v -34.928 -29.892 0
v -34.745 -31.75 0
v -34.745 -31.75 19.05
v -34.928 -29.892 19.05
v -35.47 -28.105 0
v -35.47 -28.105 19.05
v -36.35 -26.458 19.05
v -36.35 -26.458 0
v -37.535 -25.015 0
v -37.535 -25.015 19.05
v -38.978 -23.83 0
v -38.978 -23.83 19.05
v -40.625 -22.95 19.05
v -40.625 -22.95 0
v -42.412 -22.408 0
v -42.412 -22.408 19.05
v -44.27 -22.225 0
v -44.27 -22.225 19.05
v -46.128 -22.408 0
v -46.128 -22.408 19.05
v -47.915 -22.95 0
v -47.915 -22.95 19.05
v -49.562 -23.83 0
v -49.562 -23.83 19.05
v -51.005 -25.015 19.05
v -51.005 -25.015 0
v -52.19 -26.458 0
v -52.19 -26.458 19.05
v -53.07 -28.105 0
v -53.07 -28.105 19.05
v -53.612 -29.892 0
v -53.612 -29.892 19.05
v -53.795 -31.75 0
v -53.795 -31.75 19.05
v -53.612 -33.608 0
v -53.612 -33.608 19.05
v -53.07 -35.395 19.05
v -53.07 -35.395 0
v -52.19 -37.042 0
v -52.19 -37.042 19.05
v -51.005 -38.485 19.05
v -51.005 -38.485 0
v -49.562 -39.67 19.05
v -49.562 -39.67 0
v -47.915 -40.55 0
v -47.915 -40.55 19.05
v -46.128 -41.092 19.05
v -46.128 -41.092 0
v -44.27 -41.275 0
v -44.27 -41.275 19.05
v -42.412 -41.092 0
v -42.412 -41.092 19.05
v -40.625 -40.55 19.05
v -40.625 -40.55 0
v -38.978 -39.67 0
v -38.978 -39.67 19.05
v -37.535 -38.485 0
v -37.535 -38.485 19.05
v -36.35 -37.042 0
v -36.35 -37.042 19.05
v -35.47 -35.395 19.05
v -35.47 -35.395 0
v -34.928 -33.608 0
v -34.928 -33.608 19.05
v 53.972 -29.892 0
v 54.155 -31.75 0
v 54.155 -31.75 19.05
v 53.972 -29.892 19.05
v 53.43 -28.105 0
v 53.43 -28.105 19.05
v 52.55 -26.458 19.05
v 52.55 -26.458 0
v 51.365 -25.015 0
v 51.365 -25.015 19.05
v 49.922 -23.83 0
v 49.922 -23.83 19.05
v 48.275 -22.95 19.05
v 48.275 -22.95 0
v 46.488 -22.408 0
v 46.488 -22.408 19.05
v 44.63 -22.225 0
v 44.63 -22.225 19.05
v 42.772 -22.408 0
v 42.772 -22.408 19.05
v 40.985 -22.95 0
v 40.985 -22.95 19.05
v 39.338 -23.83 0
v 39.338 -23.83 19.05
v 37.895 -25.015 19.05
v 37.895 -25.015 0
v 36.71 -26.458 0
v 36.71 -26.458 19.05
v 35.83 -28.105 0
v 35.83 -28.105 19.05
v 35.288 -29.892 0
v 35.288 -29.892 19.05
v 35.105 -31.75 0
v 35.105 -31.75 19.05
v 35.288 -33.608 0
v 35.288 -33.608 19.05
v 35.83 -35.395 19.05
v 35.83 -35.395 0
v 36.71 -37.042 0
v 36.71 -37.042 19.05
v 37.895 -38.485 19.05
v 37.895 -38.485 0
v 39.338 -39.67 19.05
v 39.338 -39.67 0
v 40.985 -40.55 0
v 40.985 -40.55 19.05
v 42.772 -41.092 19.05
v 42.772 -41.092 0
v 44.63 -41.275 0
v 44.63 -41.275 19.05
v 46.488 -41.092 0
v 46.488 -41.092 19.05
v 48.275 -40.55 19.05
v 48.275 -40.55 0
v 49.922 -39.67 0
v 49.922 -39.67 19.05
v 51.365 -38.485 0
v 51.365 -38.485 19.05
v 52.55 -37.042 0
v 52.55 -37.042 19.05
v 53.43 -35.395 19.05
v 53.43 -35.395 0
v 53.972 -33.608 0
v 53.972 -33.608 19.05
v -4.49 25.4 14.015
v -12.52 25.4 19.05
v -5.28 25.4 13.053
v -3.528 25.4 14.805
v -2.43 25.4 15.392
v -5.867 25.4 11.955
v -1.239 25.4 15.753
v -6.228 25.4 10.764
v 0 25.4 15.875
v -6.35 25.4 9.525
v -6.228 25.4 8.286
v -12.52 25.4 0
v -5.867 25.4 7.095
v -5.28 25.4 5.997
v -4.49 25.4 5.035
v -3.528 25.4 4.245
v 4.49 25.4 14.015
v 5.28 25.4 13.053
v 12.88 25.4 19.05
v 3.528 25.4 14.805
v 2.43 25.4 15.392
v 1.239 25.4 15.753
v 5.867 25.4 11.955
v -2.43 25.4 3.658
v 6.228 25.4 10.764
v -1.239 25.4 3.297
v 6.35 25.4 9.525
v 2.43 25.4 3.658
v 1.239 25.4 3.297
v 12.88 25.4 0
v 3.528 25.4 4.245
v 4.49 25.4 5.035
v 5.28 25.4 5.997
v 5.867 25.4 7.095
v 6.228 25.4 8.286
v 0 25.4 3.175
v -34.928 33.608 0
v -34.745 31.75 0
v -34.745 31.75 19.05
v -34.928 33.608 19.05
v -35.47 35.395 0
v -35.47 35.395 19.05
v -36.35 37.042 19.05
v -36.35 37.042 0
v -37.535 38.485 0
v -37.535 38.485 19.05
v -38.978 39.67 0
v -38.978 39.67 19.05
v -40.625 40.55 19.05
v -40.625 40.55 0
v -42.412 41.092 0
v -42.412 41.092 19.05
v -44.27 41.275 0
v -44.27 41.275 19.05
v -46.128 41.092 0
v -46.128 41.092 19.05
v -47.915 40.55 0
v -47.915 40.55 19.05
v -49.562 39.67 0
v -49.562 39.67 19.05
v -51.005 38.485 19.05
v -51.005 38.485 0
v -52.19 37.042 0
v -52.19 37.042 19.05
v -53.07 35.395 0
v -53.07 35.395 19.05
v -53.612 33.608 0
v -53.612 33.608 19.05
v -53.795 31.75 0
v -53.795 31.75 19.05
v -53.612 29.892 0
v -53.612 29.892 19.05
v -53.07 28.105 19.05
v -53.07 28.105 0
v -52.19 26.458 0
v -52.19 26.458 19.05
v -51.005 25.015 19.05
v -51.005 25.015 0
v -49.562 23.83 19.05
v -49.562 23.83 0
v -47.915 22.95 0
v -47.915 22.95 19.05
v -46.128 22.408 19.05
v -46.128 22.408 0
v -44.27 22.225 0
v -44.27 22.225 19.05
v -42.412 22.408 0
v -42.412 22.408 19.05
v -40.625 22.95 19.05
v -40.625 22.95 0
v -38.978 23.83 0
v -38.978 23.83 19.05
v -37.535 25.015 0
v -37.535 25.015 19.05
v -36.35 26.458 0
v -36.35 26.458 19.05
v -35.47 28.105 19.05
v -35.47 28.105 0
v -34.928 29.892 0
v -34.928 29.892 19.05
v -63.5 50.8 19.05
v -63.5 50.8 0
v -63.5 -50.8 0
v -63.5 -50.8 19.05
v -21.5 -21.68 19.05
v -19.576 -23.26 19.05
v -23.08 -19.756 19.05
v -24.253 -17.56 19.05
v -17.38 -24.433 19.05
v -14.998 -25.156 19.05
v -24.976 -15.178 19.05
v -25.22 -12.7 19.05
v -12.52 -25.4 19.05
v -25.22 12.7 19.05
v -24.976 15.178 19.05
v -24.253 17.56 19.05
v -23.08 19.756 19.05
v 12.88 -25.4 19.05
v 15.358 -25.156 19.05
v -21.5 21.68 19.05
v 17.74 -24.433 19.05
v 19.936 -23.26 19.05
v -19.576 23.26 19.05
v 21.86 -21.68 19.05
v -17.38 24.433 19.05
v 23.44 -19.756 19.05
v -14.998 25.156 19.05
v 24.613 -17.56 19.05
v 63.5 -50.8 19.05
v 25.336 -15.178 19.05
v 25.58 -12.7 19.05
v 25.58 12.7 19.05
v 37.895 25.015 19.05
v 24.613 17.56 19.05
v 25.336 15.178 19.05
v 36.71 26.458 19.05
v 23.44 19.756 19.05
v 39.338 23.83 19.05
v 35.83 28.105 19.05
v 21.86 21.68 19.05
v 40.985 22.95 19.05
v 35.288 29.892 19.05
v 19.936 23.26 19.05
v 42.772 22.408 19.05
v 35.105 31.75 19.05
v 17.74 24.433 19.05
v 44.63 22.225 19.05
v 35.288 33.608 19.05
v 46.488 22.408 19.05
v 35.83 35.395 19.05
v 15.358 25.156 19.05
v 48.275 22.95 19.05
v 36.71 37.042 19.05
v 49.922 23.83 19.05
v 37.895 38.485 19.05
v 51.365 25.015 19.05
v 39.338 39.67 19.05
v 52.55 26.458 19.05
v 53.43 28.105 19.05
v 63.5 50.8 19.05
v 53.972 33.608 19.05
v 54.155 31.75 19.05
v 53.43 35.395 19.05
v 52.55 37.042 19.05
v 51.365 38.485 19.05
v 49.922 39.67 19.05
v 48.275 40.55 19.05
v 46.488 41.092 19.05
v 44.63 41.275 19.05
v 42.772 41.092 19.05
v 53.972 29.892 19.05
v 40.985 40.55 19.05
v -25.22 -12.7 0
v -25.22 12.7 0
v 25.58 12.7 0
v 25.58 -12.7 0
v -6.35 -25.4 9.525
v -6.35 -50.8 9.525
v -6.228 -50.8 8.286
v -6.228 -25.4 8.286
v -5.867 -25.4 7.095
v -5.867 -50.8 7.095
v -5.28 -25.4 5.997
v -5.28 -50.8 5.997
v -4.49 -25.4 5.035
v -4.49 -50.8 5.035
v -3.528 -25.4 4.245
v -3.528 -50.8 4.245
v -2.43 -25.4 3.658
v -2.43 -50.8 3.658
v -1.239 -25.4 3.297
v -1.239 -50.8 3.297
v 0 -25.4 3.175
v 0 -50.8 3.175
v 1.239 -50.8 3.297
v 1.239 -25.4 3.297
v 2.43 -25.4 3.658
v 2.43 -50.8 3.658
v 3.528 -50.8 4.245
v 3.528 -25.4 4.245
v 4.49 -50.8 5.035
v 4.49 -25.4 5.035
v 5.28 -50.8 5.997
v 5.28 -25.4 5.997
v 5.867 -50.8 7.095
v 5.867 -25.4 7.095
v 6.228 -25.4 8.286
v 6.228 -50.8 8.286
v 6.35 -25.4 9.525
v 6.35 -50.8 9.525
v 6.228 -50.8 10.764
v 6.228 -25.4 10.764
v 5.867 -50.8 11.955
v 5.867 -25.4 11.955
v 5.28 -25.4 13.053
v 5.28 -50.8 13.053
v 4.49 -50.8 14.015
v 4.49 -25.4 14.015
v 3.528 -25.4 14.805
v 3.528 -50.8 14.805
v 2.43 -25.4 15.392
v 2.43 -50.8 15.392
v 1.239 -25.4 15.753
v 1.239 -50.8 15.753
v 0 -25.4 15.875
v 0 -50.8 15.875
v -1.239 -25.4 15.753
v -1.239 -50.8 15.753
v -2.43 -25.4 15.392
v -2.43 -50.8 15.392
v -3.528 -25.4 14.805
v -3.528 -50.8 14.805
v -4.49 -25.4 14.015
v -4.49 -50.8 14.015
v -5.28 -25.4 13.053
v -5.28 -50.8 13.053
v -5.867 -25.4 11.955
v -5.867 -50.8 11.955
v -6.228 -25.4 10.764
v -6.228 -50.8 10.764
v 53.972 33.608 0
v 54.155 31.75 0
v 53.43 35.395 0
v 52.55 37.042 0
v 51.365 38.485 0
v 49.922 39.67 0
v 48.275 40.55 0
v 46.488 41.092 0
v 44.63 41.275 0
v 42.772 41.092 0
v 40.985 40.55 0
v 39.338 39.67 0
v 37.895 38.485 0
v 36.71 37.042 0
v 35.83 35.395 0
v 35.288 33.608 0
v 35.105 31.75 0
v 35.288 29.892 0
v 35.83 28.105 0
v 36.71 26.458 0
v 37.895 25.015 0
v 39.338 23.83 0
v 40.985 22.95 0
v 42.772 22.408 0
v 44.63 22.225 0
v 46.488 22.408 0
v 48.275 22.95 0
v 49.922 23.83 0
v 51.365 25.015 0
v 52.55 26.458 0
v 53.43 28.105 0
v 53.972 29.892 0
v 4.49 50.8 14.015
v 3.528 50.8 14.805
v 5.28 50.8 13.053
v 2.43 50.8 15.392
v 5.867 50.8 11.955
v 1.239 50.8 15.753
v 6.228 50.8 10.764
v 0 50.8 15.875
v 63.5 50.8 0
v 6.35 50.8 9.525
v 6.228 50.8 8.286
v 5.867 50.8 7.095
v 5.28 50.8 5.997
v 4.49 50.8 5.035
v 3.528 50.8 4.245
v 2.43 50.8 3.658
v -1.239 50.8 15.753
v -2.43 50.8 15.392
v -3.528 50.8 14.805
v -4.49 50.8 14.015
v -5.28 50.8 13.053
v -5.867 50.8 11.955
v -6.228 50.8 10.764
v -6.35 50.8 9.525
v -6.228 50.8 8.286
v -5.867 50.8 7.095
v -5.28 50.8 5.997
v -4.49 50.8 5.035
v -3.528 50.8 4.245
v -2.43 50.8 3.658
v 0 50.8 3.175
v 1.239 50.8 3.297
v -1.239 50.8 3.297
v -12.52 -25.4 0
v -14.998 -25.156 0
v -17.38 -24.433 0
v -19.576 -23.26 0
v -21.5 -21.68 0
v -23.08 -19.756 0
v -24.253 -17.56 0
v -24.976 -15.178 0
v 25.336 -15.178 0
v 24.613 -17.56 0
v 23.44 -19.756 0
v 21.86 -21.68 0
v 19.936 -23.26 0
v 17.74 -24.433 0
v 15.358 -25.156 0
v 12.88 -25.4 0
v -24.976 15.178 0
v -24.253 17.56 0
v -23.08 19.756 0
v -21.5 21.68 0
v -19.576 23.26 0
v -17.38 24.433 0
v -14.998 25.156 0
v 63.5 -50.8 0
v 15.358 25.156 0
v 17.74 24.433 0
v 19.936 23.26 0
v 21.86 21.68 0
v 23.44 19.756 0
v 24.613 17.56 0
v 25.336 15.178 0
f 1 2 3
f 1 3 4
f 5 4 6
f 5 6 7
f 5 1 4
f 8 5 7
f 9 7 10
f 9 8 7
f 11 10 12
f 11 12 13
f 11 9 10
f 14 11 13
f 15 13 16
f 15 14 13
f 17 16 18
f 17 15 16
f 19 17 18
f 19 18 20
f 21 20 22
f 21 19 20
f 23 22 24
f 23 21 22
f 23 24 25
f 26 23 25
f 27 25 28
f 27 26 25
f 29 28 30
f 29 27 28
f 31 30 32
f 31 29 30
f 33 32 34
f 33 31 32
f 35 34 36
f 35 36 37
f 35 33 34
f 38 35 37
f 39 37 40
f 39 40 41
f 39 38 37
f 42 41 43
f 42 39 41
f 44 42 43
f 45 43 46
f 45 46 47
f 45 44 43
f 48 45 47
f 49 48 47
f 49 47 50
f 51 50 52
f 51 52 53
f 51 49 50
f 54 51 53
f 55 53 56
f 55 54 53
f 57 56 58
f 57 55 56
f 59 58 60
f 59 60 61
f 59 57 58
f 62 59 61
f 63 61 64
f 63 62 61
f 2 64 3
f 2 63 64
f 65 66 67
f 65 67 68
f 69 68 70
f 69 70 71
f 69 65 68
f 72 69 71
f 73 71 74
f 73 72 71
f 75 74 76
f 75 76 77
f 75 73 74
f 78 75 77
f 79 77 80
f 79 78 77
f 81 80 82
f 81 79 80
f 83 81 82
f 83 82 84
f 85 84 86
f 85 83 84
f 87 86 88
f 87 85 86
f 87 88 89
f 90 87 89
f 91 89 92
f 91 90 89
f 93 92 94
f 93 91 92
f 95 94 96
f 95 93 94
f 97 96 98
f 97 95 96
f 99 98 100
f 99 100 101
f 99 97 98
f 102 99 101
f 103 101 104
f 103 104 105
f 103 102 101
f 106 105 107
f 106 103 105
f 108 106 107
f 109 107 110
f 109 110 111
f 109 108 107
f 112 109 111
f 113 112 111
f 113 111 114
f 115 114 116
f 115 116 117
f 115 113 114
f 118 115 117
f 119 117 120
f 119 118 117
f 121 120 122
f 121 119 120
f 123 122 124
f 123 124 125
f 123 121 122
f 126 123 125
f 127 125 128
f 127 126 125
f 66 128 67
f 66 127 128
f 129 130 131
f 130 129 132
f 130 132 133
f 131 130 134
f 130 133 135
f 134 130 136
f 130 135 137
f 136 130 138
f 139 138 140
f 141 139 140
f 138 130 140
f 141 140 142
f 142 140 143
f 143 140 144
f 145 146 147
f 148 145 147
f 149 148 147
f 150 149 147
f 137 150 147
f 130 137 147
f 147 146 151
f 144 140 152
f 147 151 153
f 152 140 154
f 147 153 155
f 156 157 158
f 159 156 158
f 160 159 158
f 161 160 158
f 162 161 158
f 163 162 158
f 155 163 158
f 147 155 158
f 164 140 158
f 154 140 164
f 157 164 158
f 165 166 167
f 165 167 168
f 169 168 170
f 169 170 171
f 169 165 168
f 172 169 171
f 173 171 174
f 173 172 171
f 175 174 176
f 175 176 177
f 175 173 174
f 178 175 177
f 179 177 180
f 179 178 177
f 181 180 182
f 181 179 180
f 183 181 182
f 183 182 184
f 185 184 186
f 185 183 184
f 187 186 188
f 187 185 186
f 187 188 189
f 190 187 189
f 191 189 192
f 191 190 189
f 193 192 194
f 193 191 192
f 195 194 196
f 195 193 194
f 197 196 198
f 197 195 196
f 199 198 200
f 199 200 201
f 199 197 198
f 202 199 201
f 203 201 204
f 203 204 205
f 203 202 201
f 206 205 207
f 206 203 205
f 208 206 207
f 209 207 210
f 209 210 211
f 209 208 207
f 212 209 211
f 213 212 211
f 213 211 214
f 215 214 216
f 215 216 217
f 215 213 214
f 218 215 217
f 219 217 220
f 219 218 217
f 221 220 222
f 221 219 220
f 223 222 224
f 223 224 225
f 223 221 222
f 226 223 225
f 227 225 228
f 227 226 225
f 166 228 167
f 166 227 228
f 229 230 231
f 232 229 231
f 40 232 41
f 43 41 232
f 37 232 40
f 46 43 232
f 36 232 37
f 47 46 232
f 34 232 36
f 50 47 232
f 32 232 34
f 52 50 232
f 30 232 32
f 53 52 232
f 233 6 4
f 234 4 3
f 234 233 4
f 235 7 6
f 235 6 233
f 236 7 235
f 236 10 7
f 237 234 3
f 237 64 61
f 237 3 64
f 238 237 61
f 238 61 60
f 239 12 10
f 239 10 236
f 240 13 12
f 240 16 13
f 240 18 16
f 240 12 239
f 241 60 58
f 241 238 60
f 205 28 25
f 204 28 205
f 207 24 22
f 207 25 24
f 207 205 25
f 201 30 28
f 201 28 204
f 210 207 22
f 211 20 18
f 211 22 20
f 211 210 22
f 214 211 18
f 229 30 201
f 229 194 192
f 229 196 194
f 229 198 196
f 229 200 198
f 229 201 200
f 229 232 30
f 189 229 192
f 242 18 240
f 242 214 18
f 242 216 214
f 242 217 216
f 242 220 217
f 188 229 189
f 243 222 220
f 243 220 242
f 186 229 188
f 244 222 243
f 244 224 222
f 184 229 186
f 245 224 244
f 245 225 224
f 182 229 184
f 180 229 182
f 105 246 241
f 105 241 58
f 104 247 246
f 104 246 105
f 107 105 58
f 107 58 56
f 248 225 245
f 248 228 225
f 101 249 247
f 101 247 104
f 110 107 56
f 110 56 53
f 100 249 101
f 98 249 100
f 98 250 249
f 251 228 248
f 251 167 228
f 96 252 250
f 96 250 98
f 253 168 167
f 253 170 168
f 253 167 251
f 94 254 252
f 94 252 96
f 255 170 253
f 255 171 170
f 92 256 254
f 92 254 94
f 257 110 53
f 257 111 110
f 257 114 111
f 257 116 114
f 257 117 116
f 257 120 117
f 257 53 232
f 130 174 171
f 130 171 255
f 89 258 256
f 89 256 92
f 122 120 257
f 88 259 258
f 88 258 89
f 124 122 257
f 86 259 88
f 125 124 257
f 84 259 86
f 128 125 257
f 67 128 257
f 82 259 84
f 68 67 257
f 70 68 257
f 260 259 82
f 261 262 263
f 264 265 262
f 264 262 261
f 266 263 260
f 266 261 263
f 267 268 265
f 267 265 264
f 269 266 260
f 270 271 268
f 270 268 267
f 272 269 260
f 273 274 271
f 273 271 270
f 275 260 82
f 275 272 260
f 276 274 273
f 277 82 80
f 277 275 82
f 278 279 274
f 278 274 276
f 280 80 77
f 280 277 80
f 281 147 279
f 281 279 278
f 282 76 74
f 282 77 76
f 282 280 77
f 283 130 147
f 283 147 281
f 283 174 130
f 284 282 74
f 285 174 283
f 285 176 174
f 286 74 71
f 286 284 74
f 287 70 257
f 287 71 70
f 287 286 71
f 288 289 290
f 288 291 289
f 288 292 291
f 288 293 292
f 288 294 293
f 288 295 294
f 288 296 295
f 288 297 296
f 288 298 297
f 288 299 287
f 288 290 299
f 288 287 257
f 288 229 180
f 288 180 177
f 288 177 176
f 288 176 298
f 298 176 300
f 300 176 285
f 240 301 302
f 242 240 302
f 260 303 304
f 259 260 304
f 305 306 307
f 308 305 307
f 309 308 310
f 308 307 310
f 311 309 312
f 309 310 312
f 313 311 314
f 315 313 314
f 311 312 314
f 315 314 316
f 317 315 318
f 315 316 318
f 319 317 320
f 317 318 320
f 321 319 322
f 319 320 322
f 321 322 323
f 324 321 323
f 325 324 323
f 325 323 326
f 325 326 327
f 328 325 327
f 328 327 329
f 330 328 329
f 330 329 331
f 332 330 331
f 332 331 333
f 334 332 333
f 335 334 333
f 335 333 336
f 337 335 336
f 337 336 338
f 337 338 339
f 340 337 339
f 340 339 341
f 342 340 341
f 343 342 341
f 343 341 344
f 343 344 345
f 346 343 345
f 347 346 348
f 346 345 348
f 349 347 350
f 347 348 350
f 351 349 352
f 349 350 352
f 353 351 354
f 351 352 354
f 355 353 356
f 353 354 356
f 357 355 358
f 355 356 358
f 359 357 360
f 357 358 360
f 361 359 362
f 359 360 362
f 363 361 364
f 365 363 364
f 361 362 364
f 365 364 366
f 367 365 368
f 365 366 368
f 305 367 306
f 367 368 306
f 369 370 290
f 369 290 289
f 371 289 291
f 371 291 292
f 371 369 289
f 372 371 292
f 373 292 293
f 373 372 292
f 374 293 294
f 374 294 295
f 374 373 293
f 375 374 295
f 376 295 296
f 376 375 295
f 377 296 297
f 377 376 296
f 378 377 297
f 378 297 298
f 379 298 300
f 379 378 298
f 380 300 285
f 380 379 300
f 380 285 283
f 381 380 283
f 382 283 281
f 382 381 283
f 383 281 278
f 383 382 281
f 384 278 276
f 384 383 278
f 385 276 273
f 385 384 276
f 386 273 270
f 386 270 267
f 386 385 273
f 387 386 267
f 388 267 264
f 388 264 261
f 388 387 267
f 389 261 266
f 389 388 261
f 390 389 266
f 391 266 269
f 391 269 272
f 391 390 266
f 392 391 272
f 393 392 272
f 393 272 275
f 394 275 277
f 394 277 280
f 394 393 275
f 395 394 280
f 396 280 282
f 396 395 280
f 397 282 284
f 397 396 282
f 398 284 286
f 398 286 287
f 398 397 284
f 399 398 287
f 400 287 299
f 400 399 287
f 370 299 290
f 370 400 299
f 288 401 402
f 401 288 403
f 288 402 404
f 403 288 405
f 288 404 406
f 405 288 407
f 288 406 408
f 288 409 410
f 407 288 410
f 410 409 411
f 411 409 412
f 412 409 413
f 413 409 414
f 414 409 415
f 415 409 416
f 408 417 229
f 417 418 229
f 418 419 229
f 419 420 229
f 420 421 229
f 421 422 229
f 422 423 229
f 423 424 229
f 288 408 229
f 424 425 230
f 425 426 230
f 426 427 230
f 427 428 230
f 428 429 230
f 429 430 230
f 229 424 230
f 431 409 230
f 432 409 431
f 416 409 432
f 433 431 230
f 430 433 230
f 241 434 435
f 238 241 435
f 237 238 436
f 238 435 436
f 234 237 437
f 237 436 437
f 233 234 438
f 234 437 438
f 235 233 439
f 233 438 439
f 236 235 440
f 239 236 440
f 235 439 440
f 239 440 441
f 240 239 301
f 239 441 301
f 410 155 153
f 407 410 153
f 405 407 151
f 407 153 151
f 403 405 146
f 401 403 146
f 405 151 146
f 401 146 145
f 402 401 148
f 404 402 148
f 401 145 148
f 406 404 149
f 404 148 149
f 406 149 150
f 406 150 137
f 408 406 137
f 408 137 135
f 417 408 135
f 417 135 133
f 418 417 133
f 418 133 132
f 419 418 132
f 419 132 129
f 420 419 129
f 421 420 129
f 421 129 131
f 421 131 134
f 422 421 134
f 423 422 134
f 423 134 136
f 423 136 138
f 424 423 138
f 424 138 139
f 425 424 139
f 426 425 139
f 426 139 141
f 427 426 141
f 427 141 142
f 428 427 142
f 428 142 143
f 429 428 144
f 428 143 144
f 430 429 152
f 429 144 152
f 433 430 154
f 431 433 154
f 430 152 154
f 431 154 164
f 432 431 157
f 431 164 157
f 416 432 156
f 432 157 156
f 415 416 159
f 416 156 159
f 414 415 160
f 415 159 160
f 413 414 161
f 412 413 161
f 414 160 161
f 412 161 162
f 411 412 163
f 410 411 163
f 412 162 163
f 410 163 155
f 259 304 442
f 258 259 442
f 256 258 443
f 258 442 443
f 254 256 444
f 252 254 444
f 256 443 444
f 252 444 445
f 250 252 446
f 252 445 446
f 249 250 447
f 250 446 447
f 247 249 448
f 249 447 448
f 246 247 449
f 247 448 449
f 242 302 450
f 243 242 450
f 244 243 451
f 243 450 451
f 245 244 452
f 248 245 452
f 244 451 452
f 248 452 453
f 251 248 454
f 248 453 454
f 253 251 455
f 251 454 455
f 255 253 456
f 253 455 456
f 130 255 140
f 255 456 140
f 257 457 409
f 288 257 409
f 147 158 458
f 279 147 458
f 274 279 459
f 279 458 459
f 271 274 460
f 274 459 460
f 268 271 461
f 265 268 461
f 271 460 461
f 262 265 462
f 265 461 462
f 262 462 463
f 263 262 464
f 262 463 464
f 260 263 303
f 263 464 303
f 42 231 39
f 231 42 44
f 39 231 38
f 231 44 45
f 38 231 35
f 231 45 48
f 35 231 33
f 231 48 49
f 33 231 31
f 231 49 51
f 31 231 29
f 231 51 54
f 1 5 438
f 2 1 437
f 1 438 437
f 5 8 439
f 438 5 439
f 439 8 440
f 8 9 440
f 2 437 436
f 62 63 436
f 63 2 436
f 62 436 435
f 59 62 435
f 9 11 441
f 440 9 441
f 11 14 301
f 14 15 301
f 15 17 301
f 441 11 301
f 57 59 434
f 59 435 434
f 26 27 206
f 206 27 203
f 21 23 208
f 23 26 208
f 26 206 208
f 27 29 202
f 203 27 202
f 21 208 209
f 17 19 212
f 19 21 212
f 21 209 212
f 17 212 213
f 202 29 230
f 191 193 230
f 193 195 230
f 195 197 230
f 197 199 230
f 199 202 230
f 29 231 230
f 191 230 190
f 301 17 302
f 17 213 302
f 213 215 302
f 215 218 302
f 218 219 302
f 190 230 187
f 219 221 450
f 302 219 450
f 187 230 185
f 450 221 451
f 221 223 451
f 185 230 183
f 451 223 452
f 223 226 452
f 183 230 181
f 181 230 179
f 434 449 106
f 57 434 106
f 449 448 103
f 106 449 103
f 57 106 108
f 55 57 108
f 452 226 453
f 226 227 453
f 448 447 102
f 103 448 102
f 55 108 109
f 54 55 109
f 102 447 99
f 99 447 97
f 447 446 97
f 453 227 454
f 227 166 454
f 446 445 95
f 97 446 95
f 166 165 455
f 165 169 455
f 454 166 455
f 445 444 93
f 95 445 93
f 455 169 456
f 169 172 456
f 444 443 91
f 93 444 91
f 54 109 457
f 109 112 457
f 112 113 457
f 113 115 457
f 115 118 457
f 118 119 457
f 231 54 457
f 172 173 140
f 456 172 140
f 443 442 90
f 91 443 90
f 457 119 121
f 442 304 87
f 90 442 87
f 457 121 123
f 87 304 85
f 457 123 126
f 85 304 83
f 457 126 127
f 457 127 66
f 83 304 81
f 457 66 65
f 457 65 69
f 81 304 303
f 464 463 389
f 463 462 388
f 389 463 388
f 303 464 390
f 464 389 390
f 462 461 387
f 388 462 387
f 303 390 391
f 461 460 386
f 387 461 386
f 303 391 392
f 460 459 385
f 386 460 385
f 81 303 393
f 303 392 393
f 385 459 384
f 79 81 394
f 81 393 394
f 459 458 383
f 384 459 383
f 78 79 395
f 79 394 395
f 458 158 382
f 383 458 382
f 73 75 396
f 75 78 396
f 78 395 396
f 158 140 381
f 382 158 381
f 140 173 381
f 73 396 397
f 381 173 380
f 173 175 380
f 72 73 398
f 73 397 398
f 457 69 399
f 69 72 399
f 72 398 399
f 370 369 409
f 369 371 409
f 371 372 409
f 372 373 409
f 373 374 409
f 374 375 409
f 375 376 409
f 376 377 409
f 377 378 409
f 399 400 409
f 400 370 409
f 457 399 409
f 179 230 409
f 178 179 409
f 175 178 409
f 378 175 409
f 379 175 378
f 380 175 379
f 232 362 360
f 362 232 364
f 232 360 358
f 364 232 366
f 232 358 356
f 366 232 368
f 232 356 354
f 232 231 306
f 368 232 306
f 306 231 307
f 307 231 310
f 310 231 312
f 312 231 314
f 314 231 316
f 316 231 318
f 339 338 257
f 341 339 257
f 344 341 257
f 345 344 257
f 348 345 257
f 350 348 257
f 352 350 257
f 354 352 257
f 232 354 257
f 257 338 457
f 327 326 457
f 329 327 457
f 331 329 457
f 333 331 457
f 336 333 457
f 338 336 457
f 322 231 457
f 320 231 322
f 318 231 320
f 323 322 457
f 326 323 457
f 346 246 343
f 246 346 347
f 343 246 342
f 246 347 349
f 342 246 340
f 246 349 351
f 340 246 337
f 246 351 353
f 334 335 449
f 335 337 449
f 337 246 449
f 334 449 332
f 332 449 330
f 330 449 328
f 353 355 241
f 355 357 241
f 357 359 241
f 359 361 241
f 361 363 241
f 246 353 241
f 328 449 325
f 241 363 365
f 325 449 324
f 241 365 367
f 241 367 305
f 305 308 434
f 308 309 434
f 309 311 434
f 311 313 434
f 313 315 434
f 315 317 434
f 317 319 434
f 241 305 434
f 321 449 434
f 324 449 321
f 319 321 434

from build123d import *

# Parameters (mm, degrees)
F0_R     = 9.525
F1_DEPTH = 19.05
F3_D     = 12.7
F3_DEPTH = 101.6
F3_TIP   = 3.8154649308
F5_D     = 12.7
F5_DEPTH = 254
F5_TIP   = 3.8154649308


with BuildPart() as f1:
    # F0 (on Top) → F1 (new body)
    with BuildSketch(Plane.XY):
        Polygon((-63.5, 50.8), (-63.5, 0), (-63.5, -50.8), (0, -50.8), (63.5, -50.8), (63.5, 0), (63.5, 50.8), (0, 50.8), align=None)
        with Locations((-44.2700514078, -31.75)):
            Circle(F0_R, mode=Mode.SUBTRACT)
        with Locations((44.6299485922, -31.75)):
            Circle(F0_R, mode=Mode.SUBTRACT)
        with BuildLine():
            ThreePointArc((-25.2200514078, 12.7), (-21.5003075289, 21.6802561211), (-12.5200514078, 25.4))
            Line((-12.5200514078, 25.4), (12.8799485922, 25.4))
            ThreePointArc((12.8799485922, 25.4), (21.8602047133, 21.6802561211), (25.5799485922, 12.7))
            Line((25.5799485922, 12.7), (25.5799485922, -12.7))
            ThreePointArc((25.5799485922, -12.7), (21.8602047133, -21.6802561211), (12.8799485922, -25.4))
            Line((12.8799485922, -25.4), (-12.5200514078, -25.4))
            ThreePointArc((-12.5200514078, -25.4), (-21.5003075289, -21.6802561211), (-25.2200514078, -12.7))
            Line((-25.2200514078, -12.7), (-25.2200514078, 12.7))
        make_face(mode=Mode.SUBTRACT)
        with Locations((-44.2700514078, 31.75)):
            Circle(F0_R, mode=Mode.SUBTRACT)
        with Locations((44.6299485922, 31.75)):
            Circle(F0_R, mode=Mode.SUBTRACT)
    extrude(amount=F1_DEPTH)

    # F3 (one way)
    with BuildSketch(Plane.XZ):
        with Locations((0, 9.525)):
            Circle(F3_D / 2)
    extrude(amount=-F3_DEPTH, mode=Mode.SUBTRACT)
    with Locations(Plane.XZ):
        with Locations((0, 9.525)):
            with Locations((0, 0, -(F3_DEPTH + F3_TIP / 2))):  # 118° drill point
                Cone(0, F3_D / 2, F3_TIP, mode=Mode.SUBTRACT)

    # F5
    with Locations(Plane(origin=(0, 0, 0), x_dir=(1, 0, 0), z_dir=(0, 1, 0))):
        with Locations((0, -9.525)):
            Hole(F5_D / 2, depth=F5_DEPTH)
            with Locations((0, 0, -(F5_DEPTH + F5_TIP / 2))):  # 118° drill point
                Cone(0, F5_D / 2, F5_TIP, mode=Mode.SUBTRACT)


solid = f1.part
